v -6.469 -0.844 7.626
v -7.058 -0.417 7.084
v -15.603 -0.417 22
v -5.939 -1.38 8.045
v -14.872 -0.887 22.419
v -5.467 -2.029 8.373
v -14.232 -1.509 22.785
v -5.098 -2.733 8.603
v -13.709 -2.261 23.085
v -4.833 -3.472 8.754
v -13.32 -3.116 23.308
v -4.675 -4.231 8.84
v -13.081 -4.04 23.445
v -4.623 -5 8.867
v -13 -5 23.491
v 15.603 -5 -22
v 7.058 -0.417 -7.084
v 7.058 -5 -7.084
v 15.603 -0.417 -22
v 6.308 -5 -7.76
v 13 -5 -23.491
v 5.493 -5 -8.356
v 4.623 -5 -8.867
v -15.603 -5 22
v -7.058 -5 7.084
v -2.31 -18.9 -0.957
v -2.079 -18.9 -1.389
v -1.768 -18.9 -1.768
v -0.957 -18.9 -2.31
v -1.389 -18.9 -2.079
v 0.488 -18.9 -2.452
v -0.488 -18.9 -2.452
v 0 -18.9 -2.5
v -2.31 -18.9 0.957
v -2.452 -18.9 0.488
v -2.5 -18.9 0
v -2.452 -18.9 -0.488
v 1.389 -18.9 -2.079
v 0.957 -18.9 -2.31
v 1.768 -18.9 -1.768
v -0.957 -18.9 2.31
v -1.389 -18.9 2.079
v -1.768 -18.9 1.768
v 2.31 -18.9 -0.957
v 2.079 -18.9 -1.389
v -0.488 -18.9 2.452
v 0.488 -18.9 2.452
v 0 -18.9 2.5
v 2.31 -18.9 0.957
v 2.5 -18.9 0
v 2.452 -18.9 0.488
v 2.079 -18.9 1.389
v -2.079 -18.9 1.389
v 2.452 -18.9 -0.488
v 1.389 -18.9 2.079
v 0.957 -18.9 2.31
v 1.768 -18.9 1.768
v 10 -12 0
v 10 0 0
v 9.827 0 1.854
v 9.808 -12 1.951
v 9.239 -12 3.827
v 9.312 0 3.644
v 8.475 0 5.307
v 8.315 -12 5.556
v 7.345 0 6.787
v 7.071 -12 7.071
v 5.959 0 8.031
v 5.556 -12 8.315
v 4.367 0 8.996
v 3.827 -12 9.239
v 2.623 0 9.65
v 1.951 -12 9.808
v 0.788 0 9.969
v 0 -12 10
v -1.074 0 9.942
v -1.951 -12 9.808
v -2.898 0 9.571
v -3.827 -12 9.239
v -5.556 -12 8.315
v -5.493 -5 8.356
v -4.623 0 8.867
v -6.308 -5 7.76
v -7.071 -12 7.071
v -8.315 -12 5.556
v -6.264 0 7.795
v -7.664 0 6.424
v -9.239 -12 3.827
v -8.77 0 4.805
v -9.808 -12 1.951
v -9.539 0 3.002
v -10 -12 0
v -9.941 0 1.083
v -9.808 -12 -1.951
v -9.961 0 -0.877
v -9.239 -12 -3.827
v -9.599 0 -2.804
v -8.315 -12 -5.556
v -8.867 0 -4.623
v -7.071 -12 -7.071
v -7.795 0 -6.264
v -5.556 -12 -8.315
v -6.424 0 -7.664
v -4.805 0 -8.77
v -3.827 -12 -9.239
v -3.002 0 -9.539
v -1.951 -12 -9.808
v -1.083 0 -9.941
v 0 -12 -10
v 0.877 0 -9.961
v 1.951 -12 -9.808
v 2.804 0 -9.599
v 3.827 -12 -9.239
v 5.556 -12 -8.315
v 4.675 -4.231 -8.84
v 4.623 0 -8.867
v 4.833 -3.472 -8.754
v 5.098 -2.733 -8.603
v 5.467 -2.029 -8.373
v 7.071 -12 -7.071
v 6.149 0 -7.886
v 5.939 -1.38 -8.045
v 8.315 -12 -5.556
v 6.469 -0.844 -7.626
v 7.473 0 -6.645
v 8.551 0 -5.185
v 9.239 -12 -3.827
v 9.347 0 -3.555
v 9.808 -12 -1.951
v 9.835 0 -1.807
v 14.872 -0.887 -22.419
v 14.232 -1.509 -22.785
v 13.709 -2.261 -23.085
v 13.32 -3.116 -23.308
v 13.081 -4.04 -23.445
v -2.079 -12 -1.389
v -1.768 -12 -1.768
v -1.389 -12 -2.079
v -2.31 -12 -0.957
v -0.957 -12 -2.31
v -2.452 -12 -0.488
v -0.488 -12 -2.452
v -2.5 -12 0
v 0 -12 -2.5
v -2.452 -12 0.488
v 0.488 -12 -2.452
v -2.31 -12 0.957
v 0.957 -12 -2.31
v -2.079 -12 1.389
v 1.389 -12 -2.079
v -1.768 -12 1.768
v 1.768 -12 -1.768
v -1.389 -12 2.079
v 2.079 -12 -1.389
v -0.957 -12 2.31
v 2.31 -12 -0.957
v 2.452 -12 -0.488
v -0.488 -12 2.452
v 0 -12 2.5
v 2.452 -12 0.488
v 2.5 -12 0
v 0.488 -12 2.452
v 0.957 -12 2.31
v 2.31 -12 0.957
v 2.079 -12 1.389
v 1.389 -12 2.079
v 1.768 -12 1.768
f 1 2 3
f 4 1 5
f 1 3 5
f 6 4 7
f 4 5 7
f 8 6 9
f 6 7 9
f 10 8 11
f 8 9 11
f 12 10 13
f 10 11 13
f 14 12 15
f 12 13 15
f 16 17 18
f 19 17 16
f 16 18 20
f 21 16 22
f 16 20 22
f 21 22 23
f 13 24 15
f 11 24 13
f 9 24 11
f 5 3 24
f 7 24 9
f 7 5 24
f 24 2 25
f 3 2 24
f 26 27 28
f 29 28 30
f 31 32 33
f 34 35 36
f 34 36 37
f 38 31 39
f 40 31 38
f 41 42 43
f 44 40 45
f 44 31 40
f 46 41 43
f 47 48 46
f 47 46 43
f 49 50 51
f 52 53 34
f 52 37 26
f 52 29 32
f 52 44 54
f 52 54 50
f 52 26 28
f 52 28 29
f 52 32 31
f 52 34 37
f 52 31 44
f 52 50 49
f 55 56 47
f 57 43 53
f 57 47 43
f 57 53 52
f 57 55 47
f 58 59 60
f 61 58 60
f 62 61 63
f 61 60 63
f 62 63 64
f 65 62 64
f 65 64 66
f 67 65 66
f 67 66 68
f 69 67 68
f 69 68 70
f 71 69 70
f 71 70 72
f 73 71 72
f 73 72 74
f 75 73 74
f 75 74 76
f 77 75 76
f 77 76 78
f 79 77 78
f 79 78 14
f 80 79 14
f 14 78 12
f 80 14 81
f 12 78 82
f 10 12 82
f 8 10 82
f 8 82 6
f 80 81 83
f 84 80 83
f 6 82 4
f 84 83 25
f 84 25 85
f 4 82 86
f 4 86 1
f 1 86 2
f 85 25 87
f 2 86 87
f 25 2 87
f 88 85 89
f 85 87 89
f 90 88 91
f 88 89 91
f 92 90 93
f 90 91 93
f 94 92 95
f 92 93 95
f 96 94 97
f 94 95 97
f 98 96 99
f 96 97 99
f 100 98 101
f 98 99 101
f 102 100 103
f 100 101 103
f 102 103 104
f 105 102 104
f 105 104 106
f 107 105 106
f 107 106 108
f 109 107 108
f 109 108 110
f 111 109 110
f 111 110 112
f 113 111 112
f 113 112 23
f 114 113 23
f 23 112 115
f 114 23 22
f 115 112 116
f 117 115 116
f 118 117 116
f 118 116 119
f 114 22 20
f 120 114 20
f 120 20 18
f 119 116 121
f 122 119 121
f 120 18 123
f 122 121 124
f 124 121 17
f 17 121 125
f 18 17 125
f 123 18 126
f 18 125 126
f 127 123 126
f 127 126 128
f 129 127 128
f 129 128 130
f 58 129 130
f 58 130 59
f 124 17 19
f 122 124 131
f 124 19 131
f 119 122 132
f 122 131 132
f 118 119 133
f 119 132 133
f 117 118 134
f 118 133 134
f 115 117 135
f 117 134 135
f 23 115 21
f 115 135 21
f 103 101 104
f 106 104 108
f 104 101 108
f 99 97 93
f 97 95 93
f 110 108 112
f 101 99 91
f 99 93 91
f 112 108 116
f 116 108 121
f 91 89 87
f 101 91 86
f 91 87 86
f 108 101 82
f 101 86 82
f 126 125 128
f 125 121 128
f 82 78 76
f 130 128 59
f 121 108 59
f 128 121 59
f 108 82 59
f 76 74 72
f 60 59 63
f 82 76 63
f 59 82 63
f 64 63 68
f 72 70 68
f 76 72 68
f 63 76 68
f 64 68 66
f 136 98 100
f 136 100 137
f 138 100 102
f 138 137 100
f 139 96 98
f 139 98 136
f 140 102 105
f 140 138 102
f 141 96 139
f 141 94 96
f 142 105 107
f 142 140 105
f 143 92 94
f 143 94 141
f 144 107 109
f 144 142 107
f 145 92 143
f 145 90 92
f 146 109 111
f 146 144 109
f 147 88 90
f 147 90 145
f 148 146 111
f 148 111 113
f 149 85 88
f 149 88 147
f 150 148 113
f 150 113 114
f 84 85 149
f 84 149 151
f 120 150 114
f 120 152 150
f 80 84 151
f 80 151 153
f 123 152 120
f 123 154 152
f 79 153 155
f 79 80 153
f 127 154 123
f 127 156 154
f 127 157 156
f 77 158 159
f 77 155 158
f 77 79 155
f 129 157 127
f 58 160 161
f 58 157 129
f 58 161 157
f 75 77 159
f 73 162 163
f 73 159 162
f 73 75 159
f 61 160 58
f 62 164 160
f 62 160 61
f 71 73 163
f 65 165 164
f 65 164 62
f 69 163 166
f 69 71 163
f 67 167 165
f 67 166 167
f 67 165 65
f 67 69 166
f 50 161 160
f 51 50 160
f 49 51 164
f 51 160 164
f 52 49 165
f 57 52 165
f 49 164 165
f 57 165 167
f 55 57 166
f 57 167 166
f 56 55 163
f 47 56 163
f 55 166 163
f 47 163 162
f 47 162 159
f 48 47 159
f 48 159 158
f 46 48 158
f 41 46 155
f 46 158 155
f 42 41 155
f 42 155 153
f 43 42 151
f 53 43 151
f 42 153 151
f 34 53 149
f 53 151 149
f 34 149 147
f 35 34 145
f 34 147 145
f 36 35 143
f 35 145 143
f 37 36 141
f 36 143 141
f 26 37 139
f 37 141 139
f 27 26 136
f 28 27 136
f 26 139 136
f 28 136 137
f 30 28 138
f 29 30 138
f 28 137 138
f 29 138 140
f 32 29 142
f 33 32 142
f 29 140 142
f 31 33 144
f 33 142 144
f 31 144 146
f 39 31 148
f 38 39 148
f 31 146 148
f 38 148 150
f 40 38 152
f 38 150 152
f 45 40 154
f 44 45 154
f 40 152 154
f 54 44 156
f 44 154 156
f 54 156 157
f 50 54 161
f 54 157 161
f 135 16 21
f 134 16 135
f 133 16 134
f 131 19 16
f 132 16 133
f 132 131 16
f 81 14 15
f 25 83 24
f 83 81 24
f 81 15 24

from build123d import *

# Parameters (mm, degrees)
F0_R         = 10
F1_DEPTH     = 12
F3_DEPTH     = 5
F4_T4_DEPTH  = 41.8533803035
F4_S5_R      = 10
F4_T6_DEPTH  = 25
F4_T10_DEPTH = 41.8533803035
F4_S11_R     = 10
F4_T12_DEPTH = 25
F5_R         = 2.5
F6_DEPTH     = 6.9


# Not quite as in the source:
# - a fillet or chamfer that OpenCascade refuses, or shapes differently, is made with other operations: its cross-section is extruded or revolved along the edge and cut away or added


with BuildPart() as f1:
    # F0 (on Front) → F1 (new body)
    with BuildSketch(Plane.XZ):
        Circle(F0_R)
    extrude(amount=F1_DEPTH)

    # F2 (on face) → F3 (join)
    with BuildSketch(Plane(origin=(0, 0, 0), x_dir=(-1, 0, 0), z_dir=(0, 1, 0))):
        Polygon((2.4069448783, 5), (-2.4069448783, 5), (-3, 0), (3, 0), (15.6031129395, 22), (13, 23.4912421078), align=None)
        Polygon((3, 0), (-3, 0), (-15.6031129395, -22), (-13, -23.4912421078), (-2.4069448783, -5), (2.4069448783, -5), align=None)
    extrude(amount=-F3_DEPTH)

    # F4: fillet of radius 5 on 2 edges, made by hand


with BuildPart() as f4_tool2:
    # F4_s3 → F4_t4 (new body)
    with BuildSketch(Plane(origin=(-19.5578893967, 0, 34.1402611236), x_dir=(0, 1, 0), z_dir=(0.4970807026, 0, -0.8677043132))):
        with BuildLine():
            ThreePointArc((0, -4.6031129395), (-1.4644660941, -1.0675790336), (-5, 0.3968870605))
            Line((-5, 0.3968870605), (0, 0.3968870605))
            Line((0, 0.3968870605), (0, -4.6031129395))
        make_face()
    extrude(amount=F4_T4_DEPTH)

    # F4_s5 → F4_t6 (cut, symmetric)
    with BuildSketch(Plane.XZ.offset(2.5)):
        Circle(F4_S5_R)
    extrude(amount=F4_T6_DEPTH, both=True, mode=Mode.SUBTRACT)


with BuildPart() as f1_1:
    add(f1.part)

    # F4_t1: cut F4_tool2
    add(f4_tool2.part, mode=Mode.SUBTRACT)


with BuildPart() as f4_tool8:
    # F4_s9 → F4_t10 (new body)
    with BuildSketch(Plane(origin=(19.5578893967, 0, -34.1402611236), x_dir=(0, 1, 0), z_dir=(-0.4970807026, 0, 0.8677043132))):
        with BuildLine():
            ThreePointArc((0, -4.6031129395), (-1.4644660941, -1.0675790336), (-5, 0.3968870605))
            Line((-5, 0.3968870605), (0, 0.3968870605))
            Line((0, 0.3968870605), (0, -4.6031129395))
        make_face()
    extrude(amount=F4_T10_DEPTH)

    # F4_s11 → F4_t12 (cut, symmetric)
    with BuildSketch(Plane.XZ.offset(2.5)):
        Circle(F4_S11_R)
    extrude(amount=F4_T12_DEPTH, both=True, mode=Mode.SUBTRACT)


with BuildPart() as f1_2:
    add(f1_1.part)

    # F4_t7: cut F4_tool8
    add(f4_tool8.part, mode=Mode.SUBTRACT)

    # F5 (on face) → F6 (join)
    with BuildSketch(Plane.XZ.offset(12)):
        Circle(F5_R)
    extrude(amount=F6_DEPTH)


solid = f1_2.part
